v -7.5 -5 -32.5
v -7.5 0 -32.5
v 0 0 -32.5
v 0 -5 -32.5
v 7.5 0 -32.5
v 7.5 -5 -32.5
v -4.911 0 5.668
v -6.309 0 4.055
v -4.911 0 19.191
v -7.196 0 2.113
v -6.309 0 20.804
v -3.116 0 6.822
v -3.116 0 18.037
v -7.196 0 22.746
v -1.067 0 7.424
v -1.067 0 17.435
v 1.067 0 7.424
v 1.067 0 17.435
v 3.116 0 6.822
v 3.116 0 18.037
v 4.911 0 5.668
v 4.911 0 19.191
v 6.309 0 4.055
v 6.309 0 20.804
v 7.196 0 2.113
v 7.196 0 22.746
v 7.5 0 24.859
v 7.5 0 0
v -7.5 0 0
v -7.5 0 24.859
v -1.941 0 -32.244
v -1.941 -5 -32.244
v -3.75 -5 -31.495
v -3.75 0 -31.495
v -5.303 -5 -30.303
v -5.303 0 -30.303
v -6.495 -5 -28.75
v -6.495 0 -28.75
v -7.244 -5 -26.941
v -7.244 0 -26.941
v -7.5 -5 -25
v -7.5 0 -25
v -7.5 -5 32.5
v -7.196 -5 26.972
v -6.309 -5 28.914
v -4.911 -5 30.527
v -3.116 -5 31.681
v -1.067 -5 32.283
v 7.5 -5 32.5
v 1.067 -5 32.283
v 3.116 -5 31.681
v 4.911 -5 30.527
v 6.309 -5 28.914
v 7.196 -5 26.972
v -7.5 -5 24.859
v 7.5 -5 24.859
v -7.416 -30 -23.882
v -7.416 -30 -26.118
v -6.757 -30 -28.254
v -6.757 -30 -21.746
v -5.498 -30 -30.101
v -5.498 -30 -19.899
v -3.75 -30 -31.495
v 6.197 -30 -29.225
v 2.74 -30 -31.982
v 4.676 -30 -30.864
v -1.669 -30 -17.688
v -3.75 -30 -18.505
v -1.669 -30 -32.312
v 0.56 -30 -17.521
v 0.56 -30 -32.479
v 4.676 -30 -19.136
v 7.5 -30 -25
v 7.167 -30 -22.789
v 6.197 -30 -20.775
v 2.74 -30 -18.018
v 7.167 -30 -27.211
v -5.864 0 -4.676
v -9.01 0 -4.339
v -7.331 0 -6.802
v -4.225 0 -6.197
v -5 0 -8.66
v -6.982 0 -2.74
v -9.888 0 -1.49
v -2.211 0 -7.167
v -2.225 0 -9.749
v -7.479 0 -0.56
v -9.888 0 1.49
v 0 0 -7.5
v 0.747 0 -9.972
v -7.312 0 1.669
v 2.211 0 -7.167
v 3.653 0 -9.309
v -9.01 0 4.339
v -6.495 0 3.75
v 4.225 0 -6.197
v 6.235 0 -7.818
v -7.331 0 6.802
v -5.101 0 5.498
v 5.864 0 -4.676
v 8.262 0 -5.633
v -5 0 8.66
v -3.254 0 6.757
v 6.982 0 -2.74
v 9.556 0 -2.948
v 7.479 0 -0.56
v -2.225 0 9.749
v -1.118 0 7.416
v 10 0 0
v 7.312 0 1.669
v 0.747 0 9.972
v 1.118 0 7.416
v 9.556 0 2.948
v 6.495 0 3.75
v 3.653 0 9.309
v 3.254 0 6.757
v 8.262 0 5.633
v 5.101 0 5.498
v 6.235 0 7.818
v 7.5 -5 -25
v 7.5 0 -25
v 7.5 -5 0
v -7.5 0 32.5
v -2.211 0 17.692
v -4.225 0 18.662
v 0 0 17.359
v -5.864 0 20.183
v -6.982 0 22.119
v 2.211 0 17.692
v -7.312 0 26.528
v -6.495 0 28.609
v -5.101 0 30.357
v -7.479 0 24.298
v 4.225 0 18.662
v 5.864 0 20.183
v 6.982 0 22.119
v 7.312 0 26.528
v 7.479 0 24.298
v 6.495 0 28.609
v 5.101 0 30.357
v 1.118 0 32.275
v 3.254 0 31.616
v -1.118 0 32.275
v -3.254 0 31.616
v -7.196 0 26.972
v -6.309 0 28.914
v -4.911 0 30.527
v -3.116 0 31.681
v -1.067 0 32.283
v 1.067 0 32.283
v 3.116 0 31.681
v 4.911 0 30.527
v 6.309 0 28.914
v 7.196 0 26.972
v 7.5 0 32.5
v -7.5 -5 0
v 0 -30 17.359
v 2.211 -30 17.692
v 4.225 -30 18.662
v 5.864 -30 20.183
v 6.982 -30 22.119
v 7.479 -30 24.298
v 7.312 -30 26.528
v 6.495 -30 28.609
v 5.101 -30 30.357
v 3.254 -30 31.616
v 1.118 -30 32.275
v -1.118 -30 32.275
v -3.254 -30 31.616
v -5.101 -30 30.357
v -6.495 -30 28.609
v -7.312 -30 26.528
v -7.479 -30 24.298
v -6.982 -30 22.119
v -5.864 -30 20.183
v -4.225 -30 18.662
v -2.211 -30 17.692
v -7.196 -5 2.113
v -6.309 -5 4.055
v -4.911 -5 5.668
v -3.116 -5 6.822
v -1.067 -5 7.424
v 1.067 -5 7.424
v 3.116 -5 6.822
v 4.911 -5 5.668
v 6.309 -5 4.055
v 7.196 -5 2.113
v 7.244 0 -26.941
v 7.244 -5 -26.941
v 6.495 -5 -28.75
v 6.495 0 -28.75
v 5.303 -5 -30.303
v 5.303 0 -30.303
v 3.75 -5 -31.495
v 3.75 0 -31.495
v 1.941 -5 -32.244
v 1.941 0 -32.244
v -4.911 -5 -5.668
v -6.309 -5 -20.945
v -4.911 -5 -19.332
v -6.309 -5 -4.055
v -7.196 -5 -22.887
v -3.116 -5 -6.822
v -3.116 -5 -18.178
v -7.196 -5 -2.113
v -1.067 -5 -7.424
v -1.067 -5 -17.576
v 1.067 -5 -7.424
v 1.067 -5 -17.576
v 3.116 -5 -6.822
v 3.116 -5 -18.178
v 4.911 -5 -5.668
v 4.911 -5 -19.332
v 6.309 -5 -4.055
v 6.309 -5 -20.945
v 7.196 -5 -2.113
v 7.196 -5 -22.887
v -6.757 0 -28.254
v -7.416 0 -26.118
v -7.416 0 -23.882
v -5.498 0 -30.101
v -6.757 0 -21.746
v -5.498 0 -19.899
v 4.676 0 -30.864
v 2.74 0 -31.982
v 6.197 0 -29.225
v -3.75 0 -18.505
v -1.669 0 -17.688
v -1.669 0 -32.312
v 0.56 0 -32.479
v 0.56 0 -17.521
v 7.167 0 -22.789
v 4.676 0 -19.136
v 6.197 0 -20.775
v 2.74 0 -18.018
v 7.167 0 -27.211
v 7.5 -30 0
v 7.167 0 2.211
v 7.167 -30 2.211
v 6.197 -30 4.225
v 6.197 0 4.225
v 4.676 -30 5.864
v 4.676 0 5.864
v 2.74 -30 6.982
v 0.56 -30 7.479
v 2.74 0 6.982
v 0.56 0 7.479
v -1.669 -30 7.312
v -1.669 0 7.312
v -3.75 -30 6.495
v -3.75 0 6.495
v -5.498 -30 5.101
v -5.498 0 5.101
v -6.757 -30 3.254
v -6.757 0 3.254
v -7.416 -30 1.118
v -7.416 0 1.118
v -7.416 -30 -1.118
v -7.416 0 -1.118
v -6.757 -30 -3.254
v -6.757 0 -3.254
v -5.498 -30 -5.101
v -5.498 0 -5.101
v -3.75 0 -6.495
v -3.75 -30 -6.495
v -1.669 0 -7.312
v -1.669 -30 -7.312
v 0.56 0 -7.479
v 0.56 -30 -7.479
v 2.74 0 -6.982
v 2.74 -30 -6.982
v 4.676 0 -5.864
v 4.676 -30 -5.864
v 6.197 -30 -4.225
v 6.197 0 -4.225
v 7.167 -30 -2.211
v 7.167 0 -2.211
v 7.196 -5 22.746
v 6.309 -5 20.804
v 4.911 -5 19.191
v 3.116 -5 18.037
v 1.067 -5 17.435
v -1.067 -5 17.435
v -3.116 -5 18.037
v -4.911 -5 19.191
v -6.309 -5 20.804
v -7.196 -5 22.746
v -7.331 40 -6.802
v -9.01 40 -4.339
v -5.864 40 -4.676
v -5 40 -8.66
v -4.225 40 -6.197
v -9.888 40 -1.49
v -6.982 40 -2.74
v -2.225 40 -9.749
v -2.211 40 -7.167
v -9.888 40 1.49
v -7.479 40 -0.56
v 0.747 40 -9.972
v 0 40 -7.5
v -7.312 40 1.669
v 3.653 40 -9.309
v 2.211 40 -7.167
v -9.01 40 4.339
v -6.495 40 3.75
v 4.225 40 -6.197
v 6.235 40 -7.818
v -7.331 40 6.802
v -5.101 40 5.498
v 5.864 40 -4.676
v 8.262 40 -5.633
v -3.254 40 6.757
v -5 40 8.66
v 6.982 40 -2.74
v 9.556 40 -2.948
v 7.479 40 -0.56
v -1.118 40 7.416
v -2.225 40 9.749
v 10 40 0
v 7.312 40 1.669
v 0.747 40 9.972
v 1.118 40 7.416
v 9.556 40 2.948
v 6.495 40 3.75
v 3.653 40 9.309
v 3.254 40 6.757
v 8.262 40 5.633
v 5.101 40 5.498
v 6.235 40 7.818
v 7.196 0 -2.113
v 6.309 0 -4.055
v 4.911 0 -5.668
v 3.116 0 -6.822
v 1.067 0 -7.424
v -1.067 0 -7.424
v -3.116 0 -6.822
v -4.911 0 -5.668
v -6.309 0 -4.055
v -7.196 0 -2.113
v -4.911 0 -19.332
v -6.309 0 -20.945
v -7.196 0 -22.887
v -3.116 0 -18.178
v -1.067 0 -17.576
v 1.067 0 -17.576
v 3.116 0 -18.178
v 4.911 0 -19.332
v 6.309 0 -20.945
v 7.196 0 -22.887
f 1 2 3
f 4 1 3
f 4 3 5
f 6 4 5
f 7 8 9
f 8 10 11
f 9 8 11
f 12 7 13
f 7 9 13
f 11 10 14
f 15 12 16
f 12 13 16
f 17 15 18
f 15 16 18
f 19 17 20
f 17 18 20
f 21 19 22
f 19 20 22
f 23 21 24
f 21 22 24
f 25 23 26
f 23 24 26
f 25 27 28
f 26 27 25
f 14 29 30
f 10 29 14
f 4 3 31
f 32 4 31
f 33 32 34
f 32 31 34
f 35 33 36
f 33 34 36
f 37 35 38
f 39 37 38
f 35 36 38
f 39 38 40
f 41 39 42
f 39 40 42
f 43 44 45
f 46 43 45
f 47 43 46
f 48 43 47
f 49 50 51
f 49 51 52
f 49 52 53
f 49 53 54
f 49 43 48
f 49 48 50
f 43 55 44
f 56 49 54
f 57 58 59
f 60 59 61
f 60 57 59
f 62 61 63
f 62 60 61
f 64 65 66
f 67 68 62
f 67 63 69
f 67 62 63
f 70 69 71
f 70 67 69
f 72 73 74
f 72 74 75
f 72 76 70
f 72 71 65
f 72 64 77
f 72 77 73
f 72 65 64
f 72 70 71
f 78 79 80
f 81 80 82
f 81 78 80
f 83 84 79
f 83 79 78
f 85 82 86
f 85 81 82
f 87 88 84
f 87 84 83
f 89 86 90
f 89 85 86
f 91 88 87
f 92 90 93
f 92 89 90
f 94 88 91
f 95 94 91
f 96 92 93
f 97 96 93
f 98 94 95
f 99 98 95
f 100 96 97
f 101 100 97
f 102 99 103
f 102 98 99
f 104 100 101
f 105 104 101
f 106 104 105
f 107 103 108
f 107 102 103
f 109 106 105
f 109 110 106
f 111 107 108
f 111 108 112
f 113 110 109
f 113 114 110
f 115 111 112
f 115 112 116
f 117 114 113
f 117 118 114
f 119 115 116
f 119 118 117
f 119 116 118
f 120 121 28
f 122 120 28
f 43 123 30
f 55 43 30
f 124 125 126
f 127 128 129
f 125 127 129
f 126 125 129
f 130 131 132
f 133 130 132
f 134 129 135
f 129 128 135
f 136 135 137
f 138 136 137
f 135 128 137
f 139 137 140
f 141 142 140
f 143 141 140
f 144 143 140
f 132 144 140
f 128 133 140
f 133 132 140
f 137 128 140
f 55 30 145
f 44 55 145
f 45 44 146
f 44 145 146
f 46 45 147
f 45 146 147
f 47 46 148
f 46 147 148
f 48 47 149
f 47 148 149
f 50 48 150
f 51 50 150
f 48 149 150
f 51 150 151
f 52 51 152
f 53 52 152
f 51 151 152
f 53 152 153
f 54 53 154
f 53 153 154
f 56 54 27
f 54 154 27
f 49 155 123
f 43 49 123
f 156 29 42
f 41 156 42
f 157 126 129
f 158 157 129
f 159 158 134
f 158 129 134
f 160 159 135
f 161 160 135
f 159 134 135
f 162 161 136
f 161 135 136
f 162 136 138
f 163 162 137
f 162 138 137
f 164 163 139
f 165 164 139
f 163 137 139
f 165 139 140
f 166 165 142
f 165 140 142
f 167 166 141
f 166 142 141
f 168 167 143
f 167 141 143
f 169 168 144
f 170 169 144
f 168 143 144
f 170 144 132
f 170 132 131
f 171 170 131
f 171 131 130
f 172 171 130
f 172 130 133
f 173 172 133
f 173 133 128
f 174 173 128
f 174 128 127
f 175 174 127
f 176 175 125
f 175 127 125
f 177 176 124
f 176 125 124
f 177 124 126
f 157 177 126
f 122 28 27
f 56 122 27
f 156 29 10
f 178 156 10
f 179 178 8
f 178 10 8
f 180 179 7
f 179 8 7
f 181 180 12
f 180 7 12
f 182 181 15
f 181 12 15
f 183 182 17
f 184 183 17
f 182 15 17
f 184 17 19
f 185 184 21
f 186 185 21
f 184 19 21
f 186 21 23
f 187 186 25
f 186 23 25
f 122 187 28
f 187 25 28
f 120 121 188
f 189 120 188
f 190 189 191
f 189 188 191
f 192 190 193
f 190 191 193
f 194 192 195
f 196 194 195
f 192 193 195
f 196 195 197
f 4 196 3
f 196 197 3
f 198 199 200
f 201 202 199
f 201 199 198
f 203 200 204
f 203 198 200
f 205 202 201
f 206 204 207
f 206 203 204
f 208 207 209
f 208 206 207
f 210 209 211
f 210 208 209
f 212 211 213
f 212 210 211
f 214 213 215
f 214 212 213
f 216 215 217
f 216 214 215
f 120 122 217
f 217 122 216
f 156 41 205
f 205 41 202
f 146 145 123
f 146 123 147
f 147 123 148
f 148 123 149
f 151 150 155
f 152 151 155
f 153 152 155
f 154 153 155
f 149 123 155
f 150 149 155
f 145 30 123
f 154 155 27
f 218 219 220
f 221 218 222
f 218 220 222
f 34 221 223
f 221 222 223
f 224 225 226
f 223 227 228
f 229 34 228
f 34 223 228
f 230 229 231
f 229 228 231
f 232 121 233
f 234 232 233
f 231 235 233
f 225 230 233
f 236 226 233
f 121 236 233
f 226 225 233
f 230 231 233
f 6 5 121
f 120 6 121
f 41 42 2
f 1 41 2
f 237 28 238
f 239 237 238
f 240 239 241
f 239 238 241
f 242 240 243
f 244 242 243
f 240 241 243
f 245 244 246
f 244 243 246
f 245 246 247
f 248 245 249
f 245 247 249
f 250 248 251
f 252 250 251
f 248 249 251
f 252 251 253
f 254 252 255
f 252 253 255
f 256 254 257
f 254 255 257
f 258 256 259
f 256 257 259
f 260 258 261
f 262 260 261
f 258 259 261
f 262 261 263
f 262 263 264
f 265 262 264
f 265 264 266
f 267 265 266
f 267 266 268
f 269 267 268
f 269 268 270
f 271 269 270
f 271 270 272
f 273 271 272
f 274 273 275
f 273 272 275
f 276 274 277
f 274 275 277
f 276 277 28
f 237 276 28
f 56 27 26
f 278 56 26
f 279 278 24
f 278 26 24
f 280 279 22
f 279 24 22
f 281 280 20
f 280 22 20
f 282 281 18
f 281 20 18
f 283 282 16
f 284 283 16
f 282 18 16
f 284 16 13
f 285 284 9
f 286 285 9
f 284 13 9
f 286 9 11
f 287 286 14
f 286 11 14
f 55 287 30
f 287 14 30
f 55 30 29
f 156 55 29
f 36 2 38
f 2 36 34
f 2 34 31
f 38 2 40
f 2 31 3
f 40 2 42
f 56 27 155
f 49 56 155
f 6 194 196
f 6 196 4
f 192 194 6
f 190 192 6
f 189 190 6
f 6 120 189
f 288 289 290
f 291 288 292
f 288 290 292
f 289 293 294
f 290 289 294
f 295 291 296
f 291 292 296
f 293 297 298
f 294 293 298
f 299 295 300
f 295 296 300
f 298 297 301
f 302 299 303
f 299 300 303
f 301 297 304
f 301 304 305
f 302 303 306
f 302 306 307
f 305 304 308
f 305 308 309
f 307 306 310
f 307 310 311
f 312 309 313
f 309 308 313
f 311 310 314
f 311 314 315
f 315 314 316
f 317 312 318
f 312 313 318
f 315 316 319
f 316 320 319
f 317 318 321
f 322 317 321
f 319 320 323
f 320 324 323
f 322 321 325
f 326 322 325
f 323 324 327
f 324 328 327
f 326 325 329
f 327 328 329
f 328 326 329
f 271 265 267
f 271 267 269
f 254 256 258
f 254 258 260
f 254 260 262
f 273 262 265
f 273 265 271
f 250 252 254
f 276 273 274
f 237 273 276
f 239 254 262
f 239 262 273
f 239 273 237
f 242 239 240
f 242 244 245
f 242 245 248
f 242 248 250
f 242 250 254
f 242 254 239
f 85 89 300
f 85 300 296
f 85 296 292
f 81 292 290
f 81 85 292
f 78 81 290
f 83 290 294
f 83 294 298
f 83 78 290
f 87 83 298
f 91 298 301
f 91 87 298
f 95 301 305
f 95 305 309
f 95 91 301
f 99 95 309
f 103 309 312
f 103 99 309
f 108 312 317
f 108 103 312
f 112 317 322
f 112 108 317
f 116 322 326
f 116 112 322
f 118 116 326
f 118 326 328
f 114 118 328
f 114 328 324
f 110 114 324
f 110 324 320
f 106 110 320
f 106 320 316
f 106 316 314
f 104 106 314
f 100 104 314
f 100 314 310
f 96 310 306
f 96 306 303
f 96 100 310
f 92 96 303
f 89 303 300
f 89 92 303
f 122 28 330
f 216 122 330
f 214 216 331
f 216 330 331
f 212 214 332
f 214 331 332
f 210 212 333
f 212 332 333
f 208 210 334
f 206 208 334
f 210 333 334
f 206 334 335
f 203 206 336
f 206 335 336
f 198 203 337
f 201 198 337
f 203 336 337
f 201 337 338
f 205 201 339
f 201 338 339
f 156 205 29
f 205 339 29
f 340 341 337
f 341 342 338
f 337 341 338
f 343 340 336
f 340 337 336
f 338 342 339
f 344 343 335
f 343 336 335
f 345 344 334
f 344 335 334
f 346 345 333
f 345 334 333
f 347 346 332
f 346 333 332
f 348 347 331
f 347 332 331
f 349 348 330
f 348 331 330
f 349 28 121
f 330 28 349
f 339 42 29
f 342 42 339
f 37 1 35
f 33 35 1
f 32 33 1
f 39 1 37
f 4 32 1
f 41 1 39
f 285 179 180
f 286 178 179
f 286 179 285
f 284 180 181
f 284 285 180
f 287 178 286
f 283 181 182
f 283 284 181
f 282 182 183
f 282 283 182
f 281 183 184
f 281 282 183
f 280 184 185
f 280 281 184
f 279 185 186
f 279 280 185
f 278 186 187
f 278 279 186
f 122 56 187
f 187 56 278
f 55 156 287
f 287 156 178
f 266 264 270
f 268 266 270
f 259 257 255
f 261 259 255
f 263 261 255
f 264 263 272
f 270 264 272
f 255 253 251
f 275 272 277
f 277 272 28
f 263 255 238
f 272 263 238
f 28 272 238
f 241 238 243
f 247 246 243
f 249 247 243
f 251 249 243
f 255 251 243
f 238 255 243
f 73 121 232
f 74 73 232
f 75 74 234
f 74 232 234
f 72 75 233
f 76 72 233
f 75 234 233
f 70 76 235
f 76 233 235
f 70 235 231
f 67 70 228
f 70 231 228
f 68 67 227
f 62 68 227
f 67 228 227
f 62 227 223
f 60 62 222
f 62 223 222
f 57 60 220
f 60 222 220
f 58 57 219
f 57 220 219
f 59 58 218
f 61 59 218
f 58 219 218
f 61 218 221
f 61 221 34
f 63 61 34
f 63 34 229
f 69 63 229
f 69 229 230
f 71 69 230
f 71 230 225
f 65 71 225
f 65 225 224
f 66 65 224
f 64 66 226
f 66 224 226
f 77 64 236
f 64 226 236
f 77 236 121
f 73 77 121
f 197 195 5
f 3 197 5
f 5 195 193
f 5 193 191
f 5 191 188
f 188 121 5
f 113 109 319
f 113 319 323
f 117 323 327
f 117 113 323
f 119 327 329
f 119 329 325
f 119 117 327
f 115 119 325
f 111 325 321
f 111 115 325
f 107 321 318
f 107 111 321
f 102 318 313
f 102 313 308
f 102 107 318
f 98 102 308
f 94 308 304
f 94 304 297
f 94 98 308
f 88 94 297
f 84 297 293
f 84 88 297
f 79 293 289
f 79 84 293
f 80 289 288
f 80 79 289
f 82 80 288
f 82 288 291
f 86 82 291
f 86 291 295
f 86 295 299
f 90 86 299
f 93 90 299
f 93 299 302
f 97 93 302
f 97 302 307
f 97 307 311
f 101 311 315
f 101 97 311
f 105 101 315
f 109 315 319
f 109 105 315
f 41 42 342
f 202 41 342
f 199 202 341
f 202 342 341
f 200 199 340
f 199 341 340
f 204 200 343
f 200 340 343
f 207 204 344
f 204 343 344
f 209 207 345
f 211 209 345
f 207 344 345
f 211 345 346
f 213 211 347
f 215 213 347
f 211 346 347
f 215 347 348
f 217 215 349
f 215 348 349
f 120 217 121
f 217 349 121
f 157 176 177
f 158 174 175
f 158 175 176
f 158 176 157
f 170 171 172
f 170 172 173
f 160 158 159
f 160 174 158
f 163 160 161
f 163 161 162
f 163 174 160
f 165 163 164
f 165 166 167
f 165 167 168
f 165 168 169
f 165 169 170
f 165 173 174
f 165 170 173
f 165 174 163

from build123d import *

# Parameters (mm, degrees)
F1_DEPTH = 30
F2_DEPTH = 5
F3_R     = 10
F4_DEPTH = 40


with BuildPart() as f1:
    # F0 (on Front) → F1 (new body)
    with BuildSketch(Plane.XZ):
        with BuildLine():
            ThreePointArc((0, 7.5), (-5.3033008457, 5.3033008721), (-7.5, 3.74e-08))
            ThreePointArc((-7.5, 3.74e-08), (-5.3033008721, -5.3033008457), (0, -7.5))
            ThreePointArc((0, -7.5), (5.3033008589, -5.3033008589), (7.5, 0))
            ThreePointArc((7.5, 0), (5.3033008589, 5.3033008589), (0, 7.5))
        make_face()
    extrude(amount=F1_DEPTH)


with BuildPart() as f1b:
    # F0 (on Front) → F1, piece 2 (new body)
    with BuildSketch(Plane.XZ):
        with BuildLine():
            ThreePointArc((7.5, 24.8588714749), (0, 32.3588714749), (-7.5, 24.8588714749))
            ThreePointArc((-7.5, 24.8588714749), (-5.3033008589, 19.555570616), (0, 17.3588714749))
            ThreePointArc((0, 17.3588714749), (5.3033008589, 19.555570616), (7.5, 24.8588714749))
        make_face()
    extrude(amount=F1_DEPTH)


with BuildPart() as f1c:
    # F0 (on Front) → F1, piece 3 (new body)
    with BuildSketch(Plane.XZ):
        with BuildLine():
            ThreePointArc((0, -17.5), (-5.3033008589, -19.6966991411), (-7.5, -25))
            ThreePointArc((-7.5, -25), (-5.3033008589, -30.3033008589), (0, -32.5))
            ThreePointArc((0, -32.5), (5.3033008589, -30.3033008589), (7.5, -25))
            ThreePointArc((7.5, -25), (5.3033008589, -19.6966991411), (0, -17.5))
        make_face()
    extrude(amount=F1_DEPTH)


with BuildPart() as f2:
    # F0 (on Front) → F2 (new body)
    with BuildSketch(Plane.XZ):
        with BuildLine():
            Line((7.5, 0), (7.5, 24.8588714749))
            ThreePointArc((7.5, 24.8588714749), (5.3033008589, 19.555570616), (0, 17.3588714749))
            Line((0, 17.3588714749), (0, 7.5))
            ThreePointArc((0, 7.5), (5.3033008589, 5.3033008589), (7.5, 0))
        make_face()
        with BuildLine():
            ThreePointArc((0, 17.3588714749), (-5.3033008589, 19.555570616), (-7.5, 24.8588714749))
            Line((-7.5, 24.8588714749), (-7.5, 3.74e-08))
            ThreePointArc((-7.5, 3.74e-08), (-5.3033008457, 5.3033008721), (0, 7.5))
            Line((0, 7.5), (0, 17.3588714749))
        make_face()
    extrude(amount=F2_DEPTH)


with BuildPart() as f2b:
    # F0 (on Front) → F2, piece 2 (new body)
    with BuildSketch(Plane.XZ):
        with BuildLine():
            Line((7.5, 32.5), (-7.5, 32.5))
            Line((-7.5, 32.5), (-7.5, 24.8588714749))
            ThreePointArc((-7.5, 24.8588714749), (0, 32.3588714749), (7.5, 24.8588714749))
            Line((7.5, 24.8588714749), (7.5, 32.5))
        make_face()
    extrude(amount=F2_DEPTH)


with BuildPart() as f2c:
    # F0 (on Front) → F2, piece 3 (new body)
    with BuildSketch(Plane.XZ):
        with BuildLine():
            Line((7.5, -25), (7.5, 0))
            ThreePointArc((7.5, 0), (5.3033008589, -5.3033008589), (0, -7.5))
            Line((0, -7.5), (0, -17.5))
            ThreePointArc((0, -17.5), (5.3033008589, -19.6966991411), (7.5, -25))
        make_face()
        with BuildLine():
            ThreePointArc((0, -7.5), (-5.3033008721, -5.3033008457), (-7.5, 3.74e-08))
            Line((-7.5, 3.74e-08), (-7.5, -25))
            ThreePointArc((-7.5, -25), (-5.3033008589, -19.6966991411), (0, -17.5))
            Line((0, -17.5), (0, -7.5))
        make_face()
    extrude(amount=F2_DEPTH)


with BuildPart() as f2d:
    # F0 (on Front) → F2, piece 4 (new body)
    with BuildSketch(Plane.XZ):
        with BuildLine():
            ThreePointArc((0, -32.5), (-5.3033008589, -30.3033008589), (-7.5, -25))
            Line((-7.5, -25), (-7.5, -32.5))
            Line((-7.5, -32.5), (0, -32.5))
        make_face()
    extrude(amount=F2_DEPTH)


with BuildPart() as f2e:
    # F0 (on Front) → F2, piece 5 (new body)
    with BuildSketch(Plane.XZ):
        with BuildLine():
            Line((7.5, -32.5), (7.5, -25))
            ThreePointArc((7.5, -25), (5.3033008589, -30.3033008589), (0, -32.5))
            Line((0, -32.5), (7.5, -32.5))
        make_face()
    extrude(amount=F2_DEPTH)


with BuildPart() as f4:
    # F3 (on face) → F4 (new body)
    with BuildSketch(Plane.XZ):
        Circle(F3_R)
        with BuildLine():
            ThreePointArc((-7.5, 3.74e-08), (-5.3033008457, 5.3033008721), (0, 7.5))
            ThreePointArc((0, 7.5), (5.3033008589, 5.3033008589), (7.5, 0))
            ThreePointArc((7.5, 0), (5.3033008589, -5.3033008589), (0, -7.5))
            ThreePointArc((0, -7.5), (-5.3033008721, -5.3033008457), (-7.5, 3.74e-08))
        make_face(mode=Mode.SUBTRACT)
    extrude(amount=-F4_DEPTH)


solid = Compound([f1.part, f1b.part, f1c.part, f2.part, f2b.part, f2c.part, f2d.part, f2e.part, f4.part])
